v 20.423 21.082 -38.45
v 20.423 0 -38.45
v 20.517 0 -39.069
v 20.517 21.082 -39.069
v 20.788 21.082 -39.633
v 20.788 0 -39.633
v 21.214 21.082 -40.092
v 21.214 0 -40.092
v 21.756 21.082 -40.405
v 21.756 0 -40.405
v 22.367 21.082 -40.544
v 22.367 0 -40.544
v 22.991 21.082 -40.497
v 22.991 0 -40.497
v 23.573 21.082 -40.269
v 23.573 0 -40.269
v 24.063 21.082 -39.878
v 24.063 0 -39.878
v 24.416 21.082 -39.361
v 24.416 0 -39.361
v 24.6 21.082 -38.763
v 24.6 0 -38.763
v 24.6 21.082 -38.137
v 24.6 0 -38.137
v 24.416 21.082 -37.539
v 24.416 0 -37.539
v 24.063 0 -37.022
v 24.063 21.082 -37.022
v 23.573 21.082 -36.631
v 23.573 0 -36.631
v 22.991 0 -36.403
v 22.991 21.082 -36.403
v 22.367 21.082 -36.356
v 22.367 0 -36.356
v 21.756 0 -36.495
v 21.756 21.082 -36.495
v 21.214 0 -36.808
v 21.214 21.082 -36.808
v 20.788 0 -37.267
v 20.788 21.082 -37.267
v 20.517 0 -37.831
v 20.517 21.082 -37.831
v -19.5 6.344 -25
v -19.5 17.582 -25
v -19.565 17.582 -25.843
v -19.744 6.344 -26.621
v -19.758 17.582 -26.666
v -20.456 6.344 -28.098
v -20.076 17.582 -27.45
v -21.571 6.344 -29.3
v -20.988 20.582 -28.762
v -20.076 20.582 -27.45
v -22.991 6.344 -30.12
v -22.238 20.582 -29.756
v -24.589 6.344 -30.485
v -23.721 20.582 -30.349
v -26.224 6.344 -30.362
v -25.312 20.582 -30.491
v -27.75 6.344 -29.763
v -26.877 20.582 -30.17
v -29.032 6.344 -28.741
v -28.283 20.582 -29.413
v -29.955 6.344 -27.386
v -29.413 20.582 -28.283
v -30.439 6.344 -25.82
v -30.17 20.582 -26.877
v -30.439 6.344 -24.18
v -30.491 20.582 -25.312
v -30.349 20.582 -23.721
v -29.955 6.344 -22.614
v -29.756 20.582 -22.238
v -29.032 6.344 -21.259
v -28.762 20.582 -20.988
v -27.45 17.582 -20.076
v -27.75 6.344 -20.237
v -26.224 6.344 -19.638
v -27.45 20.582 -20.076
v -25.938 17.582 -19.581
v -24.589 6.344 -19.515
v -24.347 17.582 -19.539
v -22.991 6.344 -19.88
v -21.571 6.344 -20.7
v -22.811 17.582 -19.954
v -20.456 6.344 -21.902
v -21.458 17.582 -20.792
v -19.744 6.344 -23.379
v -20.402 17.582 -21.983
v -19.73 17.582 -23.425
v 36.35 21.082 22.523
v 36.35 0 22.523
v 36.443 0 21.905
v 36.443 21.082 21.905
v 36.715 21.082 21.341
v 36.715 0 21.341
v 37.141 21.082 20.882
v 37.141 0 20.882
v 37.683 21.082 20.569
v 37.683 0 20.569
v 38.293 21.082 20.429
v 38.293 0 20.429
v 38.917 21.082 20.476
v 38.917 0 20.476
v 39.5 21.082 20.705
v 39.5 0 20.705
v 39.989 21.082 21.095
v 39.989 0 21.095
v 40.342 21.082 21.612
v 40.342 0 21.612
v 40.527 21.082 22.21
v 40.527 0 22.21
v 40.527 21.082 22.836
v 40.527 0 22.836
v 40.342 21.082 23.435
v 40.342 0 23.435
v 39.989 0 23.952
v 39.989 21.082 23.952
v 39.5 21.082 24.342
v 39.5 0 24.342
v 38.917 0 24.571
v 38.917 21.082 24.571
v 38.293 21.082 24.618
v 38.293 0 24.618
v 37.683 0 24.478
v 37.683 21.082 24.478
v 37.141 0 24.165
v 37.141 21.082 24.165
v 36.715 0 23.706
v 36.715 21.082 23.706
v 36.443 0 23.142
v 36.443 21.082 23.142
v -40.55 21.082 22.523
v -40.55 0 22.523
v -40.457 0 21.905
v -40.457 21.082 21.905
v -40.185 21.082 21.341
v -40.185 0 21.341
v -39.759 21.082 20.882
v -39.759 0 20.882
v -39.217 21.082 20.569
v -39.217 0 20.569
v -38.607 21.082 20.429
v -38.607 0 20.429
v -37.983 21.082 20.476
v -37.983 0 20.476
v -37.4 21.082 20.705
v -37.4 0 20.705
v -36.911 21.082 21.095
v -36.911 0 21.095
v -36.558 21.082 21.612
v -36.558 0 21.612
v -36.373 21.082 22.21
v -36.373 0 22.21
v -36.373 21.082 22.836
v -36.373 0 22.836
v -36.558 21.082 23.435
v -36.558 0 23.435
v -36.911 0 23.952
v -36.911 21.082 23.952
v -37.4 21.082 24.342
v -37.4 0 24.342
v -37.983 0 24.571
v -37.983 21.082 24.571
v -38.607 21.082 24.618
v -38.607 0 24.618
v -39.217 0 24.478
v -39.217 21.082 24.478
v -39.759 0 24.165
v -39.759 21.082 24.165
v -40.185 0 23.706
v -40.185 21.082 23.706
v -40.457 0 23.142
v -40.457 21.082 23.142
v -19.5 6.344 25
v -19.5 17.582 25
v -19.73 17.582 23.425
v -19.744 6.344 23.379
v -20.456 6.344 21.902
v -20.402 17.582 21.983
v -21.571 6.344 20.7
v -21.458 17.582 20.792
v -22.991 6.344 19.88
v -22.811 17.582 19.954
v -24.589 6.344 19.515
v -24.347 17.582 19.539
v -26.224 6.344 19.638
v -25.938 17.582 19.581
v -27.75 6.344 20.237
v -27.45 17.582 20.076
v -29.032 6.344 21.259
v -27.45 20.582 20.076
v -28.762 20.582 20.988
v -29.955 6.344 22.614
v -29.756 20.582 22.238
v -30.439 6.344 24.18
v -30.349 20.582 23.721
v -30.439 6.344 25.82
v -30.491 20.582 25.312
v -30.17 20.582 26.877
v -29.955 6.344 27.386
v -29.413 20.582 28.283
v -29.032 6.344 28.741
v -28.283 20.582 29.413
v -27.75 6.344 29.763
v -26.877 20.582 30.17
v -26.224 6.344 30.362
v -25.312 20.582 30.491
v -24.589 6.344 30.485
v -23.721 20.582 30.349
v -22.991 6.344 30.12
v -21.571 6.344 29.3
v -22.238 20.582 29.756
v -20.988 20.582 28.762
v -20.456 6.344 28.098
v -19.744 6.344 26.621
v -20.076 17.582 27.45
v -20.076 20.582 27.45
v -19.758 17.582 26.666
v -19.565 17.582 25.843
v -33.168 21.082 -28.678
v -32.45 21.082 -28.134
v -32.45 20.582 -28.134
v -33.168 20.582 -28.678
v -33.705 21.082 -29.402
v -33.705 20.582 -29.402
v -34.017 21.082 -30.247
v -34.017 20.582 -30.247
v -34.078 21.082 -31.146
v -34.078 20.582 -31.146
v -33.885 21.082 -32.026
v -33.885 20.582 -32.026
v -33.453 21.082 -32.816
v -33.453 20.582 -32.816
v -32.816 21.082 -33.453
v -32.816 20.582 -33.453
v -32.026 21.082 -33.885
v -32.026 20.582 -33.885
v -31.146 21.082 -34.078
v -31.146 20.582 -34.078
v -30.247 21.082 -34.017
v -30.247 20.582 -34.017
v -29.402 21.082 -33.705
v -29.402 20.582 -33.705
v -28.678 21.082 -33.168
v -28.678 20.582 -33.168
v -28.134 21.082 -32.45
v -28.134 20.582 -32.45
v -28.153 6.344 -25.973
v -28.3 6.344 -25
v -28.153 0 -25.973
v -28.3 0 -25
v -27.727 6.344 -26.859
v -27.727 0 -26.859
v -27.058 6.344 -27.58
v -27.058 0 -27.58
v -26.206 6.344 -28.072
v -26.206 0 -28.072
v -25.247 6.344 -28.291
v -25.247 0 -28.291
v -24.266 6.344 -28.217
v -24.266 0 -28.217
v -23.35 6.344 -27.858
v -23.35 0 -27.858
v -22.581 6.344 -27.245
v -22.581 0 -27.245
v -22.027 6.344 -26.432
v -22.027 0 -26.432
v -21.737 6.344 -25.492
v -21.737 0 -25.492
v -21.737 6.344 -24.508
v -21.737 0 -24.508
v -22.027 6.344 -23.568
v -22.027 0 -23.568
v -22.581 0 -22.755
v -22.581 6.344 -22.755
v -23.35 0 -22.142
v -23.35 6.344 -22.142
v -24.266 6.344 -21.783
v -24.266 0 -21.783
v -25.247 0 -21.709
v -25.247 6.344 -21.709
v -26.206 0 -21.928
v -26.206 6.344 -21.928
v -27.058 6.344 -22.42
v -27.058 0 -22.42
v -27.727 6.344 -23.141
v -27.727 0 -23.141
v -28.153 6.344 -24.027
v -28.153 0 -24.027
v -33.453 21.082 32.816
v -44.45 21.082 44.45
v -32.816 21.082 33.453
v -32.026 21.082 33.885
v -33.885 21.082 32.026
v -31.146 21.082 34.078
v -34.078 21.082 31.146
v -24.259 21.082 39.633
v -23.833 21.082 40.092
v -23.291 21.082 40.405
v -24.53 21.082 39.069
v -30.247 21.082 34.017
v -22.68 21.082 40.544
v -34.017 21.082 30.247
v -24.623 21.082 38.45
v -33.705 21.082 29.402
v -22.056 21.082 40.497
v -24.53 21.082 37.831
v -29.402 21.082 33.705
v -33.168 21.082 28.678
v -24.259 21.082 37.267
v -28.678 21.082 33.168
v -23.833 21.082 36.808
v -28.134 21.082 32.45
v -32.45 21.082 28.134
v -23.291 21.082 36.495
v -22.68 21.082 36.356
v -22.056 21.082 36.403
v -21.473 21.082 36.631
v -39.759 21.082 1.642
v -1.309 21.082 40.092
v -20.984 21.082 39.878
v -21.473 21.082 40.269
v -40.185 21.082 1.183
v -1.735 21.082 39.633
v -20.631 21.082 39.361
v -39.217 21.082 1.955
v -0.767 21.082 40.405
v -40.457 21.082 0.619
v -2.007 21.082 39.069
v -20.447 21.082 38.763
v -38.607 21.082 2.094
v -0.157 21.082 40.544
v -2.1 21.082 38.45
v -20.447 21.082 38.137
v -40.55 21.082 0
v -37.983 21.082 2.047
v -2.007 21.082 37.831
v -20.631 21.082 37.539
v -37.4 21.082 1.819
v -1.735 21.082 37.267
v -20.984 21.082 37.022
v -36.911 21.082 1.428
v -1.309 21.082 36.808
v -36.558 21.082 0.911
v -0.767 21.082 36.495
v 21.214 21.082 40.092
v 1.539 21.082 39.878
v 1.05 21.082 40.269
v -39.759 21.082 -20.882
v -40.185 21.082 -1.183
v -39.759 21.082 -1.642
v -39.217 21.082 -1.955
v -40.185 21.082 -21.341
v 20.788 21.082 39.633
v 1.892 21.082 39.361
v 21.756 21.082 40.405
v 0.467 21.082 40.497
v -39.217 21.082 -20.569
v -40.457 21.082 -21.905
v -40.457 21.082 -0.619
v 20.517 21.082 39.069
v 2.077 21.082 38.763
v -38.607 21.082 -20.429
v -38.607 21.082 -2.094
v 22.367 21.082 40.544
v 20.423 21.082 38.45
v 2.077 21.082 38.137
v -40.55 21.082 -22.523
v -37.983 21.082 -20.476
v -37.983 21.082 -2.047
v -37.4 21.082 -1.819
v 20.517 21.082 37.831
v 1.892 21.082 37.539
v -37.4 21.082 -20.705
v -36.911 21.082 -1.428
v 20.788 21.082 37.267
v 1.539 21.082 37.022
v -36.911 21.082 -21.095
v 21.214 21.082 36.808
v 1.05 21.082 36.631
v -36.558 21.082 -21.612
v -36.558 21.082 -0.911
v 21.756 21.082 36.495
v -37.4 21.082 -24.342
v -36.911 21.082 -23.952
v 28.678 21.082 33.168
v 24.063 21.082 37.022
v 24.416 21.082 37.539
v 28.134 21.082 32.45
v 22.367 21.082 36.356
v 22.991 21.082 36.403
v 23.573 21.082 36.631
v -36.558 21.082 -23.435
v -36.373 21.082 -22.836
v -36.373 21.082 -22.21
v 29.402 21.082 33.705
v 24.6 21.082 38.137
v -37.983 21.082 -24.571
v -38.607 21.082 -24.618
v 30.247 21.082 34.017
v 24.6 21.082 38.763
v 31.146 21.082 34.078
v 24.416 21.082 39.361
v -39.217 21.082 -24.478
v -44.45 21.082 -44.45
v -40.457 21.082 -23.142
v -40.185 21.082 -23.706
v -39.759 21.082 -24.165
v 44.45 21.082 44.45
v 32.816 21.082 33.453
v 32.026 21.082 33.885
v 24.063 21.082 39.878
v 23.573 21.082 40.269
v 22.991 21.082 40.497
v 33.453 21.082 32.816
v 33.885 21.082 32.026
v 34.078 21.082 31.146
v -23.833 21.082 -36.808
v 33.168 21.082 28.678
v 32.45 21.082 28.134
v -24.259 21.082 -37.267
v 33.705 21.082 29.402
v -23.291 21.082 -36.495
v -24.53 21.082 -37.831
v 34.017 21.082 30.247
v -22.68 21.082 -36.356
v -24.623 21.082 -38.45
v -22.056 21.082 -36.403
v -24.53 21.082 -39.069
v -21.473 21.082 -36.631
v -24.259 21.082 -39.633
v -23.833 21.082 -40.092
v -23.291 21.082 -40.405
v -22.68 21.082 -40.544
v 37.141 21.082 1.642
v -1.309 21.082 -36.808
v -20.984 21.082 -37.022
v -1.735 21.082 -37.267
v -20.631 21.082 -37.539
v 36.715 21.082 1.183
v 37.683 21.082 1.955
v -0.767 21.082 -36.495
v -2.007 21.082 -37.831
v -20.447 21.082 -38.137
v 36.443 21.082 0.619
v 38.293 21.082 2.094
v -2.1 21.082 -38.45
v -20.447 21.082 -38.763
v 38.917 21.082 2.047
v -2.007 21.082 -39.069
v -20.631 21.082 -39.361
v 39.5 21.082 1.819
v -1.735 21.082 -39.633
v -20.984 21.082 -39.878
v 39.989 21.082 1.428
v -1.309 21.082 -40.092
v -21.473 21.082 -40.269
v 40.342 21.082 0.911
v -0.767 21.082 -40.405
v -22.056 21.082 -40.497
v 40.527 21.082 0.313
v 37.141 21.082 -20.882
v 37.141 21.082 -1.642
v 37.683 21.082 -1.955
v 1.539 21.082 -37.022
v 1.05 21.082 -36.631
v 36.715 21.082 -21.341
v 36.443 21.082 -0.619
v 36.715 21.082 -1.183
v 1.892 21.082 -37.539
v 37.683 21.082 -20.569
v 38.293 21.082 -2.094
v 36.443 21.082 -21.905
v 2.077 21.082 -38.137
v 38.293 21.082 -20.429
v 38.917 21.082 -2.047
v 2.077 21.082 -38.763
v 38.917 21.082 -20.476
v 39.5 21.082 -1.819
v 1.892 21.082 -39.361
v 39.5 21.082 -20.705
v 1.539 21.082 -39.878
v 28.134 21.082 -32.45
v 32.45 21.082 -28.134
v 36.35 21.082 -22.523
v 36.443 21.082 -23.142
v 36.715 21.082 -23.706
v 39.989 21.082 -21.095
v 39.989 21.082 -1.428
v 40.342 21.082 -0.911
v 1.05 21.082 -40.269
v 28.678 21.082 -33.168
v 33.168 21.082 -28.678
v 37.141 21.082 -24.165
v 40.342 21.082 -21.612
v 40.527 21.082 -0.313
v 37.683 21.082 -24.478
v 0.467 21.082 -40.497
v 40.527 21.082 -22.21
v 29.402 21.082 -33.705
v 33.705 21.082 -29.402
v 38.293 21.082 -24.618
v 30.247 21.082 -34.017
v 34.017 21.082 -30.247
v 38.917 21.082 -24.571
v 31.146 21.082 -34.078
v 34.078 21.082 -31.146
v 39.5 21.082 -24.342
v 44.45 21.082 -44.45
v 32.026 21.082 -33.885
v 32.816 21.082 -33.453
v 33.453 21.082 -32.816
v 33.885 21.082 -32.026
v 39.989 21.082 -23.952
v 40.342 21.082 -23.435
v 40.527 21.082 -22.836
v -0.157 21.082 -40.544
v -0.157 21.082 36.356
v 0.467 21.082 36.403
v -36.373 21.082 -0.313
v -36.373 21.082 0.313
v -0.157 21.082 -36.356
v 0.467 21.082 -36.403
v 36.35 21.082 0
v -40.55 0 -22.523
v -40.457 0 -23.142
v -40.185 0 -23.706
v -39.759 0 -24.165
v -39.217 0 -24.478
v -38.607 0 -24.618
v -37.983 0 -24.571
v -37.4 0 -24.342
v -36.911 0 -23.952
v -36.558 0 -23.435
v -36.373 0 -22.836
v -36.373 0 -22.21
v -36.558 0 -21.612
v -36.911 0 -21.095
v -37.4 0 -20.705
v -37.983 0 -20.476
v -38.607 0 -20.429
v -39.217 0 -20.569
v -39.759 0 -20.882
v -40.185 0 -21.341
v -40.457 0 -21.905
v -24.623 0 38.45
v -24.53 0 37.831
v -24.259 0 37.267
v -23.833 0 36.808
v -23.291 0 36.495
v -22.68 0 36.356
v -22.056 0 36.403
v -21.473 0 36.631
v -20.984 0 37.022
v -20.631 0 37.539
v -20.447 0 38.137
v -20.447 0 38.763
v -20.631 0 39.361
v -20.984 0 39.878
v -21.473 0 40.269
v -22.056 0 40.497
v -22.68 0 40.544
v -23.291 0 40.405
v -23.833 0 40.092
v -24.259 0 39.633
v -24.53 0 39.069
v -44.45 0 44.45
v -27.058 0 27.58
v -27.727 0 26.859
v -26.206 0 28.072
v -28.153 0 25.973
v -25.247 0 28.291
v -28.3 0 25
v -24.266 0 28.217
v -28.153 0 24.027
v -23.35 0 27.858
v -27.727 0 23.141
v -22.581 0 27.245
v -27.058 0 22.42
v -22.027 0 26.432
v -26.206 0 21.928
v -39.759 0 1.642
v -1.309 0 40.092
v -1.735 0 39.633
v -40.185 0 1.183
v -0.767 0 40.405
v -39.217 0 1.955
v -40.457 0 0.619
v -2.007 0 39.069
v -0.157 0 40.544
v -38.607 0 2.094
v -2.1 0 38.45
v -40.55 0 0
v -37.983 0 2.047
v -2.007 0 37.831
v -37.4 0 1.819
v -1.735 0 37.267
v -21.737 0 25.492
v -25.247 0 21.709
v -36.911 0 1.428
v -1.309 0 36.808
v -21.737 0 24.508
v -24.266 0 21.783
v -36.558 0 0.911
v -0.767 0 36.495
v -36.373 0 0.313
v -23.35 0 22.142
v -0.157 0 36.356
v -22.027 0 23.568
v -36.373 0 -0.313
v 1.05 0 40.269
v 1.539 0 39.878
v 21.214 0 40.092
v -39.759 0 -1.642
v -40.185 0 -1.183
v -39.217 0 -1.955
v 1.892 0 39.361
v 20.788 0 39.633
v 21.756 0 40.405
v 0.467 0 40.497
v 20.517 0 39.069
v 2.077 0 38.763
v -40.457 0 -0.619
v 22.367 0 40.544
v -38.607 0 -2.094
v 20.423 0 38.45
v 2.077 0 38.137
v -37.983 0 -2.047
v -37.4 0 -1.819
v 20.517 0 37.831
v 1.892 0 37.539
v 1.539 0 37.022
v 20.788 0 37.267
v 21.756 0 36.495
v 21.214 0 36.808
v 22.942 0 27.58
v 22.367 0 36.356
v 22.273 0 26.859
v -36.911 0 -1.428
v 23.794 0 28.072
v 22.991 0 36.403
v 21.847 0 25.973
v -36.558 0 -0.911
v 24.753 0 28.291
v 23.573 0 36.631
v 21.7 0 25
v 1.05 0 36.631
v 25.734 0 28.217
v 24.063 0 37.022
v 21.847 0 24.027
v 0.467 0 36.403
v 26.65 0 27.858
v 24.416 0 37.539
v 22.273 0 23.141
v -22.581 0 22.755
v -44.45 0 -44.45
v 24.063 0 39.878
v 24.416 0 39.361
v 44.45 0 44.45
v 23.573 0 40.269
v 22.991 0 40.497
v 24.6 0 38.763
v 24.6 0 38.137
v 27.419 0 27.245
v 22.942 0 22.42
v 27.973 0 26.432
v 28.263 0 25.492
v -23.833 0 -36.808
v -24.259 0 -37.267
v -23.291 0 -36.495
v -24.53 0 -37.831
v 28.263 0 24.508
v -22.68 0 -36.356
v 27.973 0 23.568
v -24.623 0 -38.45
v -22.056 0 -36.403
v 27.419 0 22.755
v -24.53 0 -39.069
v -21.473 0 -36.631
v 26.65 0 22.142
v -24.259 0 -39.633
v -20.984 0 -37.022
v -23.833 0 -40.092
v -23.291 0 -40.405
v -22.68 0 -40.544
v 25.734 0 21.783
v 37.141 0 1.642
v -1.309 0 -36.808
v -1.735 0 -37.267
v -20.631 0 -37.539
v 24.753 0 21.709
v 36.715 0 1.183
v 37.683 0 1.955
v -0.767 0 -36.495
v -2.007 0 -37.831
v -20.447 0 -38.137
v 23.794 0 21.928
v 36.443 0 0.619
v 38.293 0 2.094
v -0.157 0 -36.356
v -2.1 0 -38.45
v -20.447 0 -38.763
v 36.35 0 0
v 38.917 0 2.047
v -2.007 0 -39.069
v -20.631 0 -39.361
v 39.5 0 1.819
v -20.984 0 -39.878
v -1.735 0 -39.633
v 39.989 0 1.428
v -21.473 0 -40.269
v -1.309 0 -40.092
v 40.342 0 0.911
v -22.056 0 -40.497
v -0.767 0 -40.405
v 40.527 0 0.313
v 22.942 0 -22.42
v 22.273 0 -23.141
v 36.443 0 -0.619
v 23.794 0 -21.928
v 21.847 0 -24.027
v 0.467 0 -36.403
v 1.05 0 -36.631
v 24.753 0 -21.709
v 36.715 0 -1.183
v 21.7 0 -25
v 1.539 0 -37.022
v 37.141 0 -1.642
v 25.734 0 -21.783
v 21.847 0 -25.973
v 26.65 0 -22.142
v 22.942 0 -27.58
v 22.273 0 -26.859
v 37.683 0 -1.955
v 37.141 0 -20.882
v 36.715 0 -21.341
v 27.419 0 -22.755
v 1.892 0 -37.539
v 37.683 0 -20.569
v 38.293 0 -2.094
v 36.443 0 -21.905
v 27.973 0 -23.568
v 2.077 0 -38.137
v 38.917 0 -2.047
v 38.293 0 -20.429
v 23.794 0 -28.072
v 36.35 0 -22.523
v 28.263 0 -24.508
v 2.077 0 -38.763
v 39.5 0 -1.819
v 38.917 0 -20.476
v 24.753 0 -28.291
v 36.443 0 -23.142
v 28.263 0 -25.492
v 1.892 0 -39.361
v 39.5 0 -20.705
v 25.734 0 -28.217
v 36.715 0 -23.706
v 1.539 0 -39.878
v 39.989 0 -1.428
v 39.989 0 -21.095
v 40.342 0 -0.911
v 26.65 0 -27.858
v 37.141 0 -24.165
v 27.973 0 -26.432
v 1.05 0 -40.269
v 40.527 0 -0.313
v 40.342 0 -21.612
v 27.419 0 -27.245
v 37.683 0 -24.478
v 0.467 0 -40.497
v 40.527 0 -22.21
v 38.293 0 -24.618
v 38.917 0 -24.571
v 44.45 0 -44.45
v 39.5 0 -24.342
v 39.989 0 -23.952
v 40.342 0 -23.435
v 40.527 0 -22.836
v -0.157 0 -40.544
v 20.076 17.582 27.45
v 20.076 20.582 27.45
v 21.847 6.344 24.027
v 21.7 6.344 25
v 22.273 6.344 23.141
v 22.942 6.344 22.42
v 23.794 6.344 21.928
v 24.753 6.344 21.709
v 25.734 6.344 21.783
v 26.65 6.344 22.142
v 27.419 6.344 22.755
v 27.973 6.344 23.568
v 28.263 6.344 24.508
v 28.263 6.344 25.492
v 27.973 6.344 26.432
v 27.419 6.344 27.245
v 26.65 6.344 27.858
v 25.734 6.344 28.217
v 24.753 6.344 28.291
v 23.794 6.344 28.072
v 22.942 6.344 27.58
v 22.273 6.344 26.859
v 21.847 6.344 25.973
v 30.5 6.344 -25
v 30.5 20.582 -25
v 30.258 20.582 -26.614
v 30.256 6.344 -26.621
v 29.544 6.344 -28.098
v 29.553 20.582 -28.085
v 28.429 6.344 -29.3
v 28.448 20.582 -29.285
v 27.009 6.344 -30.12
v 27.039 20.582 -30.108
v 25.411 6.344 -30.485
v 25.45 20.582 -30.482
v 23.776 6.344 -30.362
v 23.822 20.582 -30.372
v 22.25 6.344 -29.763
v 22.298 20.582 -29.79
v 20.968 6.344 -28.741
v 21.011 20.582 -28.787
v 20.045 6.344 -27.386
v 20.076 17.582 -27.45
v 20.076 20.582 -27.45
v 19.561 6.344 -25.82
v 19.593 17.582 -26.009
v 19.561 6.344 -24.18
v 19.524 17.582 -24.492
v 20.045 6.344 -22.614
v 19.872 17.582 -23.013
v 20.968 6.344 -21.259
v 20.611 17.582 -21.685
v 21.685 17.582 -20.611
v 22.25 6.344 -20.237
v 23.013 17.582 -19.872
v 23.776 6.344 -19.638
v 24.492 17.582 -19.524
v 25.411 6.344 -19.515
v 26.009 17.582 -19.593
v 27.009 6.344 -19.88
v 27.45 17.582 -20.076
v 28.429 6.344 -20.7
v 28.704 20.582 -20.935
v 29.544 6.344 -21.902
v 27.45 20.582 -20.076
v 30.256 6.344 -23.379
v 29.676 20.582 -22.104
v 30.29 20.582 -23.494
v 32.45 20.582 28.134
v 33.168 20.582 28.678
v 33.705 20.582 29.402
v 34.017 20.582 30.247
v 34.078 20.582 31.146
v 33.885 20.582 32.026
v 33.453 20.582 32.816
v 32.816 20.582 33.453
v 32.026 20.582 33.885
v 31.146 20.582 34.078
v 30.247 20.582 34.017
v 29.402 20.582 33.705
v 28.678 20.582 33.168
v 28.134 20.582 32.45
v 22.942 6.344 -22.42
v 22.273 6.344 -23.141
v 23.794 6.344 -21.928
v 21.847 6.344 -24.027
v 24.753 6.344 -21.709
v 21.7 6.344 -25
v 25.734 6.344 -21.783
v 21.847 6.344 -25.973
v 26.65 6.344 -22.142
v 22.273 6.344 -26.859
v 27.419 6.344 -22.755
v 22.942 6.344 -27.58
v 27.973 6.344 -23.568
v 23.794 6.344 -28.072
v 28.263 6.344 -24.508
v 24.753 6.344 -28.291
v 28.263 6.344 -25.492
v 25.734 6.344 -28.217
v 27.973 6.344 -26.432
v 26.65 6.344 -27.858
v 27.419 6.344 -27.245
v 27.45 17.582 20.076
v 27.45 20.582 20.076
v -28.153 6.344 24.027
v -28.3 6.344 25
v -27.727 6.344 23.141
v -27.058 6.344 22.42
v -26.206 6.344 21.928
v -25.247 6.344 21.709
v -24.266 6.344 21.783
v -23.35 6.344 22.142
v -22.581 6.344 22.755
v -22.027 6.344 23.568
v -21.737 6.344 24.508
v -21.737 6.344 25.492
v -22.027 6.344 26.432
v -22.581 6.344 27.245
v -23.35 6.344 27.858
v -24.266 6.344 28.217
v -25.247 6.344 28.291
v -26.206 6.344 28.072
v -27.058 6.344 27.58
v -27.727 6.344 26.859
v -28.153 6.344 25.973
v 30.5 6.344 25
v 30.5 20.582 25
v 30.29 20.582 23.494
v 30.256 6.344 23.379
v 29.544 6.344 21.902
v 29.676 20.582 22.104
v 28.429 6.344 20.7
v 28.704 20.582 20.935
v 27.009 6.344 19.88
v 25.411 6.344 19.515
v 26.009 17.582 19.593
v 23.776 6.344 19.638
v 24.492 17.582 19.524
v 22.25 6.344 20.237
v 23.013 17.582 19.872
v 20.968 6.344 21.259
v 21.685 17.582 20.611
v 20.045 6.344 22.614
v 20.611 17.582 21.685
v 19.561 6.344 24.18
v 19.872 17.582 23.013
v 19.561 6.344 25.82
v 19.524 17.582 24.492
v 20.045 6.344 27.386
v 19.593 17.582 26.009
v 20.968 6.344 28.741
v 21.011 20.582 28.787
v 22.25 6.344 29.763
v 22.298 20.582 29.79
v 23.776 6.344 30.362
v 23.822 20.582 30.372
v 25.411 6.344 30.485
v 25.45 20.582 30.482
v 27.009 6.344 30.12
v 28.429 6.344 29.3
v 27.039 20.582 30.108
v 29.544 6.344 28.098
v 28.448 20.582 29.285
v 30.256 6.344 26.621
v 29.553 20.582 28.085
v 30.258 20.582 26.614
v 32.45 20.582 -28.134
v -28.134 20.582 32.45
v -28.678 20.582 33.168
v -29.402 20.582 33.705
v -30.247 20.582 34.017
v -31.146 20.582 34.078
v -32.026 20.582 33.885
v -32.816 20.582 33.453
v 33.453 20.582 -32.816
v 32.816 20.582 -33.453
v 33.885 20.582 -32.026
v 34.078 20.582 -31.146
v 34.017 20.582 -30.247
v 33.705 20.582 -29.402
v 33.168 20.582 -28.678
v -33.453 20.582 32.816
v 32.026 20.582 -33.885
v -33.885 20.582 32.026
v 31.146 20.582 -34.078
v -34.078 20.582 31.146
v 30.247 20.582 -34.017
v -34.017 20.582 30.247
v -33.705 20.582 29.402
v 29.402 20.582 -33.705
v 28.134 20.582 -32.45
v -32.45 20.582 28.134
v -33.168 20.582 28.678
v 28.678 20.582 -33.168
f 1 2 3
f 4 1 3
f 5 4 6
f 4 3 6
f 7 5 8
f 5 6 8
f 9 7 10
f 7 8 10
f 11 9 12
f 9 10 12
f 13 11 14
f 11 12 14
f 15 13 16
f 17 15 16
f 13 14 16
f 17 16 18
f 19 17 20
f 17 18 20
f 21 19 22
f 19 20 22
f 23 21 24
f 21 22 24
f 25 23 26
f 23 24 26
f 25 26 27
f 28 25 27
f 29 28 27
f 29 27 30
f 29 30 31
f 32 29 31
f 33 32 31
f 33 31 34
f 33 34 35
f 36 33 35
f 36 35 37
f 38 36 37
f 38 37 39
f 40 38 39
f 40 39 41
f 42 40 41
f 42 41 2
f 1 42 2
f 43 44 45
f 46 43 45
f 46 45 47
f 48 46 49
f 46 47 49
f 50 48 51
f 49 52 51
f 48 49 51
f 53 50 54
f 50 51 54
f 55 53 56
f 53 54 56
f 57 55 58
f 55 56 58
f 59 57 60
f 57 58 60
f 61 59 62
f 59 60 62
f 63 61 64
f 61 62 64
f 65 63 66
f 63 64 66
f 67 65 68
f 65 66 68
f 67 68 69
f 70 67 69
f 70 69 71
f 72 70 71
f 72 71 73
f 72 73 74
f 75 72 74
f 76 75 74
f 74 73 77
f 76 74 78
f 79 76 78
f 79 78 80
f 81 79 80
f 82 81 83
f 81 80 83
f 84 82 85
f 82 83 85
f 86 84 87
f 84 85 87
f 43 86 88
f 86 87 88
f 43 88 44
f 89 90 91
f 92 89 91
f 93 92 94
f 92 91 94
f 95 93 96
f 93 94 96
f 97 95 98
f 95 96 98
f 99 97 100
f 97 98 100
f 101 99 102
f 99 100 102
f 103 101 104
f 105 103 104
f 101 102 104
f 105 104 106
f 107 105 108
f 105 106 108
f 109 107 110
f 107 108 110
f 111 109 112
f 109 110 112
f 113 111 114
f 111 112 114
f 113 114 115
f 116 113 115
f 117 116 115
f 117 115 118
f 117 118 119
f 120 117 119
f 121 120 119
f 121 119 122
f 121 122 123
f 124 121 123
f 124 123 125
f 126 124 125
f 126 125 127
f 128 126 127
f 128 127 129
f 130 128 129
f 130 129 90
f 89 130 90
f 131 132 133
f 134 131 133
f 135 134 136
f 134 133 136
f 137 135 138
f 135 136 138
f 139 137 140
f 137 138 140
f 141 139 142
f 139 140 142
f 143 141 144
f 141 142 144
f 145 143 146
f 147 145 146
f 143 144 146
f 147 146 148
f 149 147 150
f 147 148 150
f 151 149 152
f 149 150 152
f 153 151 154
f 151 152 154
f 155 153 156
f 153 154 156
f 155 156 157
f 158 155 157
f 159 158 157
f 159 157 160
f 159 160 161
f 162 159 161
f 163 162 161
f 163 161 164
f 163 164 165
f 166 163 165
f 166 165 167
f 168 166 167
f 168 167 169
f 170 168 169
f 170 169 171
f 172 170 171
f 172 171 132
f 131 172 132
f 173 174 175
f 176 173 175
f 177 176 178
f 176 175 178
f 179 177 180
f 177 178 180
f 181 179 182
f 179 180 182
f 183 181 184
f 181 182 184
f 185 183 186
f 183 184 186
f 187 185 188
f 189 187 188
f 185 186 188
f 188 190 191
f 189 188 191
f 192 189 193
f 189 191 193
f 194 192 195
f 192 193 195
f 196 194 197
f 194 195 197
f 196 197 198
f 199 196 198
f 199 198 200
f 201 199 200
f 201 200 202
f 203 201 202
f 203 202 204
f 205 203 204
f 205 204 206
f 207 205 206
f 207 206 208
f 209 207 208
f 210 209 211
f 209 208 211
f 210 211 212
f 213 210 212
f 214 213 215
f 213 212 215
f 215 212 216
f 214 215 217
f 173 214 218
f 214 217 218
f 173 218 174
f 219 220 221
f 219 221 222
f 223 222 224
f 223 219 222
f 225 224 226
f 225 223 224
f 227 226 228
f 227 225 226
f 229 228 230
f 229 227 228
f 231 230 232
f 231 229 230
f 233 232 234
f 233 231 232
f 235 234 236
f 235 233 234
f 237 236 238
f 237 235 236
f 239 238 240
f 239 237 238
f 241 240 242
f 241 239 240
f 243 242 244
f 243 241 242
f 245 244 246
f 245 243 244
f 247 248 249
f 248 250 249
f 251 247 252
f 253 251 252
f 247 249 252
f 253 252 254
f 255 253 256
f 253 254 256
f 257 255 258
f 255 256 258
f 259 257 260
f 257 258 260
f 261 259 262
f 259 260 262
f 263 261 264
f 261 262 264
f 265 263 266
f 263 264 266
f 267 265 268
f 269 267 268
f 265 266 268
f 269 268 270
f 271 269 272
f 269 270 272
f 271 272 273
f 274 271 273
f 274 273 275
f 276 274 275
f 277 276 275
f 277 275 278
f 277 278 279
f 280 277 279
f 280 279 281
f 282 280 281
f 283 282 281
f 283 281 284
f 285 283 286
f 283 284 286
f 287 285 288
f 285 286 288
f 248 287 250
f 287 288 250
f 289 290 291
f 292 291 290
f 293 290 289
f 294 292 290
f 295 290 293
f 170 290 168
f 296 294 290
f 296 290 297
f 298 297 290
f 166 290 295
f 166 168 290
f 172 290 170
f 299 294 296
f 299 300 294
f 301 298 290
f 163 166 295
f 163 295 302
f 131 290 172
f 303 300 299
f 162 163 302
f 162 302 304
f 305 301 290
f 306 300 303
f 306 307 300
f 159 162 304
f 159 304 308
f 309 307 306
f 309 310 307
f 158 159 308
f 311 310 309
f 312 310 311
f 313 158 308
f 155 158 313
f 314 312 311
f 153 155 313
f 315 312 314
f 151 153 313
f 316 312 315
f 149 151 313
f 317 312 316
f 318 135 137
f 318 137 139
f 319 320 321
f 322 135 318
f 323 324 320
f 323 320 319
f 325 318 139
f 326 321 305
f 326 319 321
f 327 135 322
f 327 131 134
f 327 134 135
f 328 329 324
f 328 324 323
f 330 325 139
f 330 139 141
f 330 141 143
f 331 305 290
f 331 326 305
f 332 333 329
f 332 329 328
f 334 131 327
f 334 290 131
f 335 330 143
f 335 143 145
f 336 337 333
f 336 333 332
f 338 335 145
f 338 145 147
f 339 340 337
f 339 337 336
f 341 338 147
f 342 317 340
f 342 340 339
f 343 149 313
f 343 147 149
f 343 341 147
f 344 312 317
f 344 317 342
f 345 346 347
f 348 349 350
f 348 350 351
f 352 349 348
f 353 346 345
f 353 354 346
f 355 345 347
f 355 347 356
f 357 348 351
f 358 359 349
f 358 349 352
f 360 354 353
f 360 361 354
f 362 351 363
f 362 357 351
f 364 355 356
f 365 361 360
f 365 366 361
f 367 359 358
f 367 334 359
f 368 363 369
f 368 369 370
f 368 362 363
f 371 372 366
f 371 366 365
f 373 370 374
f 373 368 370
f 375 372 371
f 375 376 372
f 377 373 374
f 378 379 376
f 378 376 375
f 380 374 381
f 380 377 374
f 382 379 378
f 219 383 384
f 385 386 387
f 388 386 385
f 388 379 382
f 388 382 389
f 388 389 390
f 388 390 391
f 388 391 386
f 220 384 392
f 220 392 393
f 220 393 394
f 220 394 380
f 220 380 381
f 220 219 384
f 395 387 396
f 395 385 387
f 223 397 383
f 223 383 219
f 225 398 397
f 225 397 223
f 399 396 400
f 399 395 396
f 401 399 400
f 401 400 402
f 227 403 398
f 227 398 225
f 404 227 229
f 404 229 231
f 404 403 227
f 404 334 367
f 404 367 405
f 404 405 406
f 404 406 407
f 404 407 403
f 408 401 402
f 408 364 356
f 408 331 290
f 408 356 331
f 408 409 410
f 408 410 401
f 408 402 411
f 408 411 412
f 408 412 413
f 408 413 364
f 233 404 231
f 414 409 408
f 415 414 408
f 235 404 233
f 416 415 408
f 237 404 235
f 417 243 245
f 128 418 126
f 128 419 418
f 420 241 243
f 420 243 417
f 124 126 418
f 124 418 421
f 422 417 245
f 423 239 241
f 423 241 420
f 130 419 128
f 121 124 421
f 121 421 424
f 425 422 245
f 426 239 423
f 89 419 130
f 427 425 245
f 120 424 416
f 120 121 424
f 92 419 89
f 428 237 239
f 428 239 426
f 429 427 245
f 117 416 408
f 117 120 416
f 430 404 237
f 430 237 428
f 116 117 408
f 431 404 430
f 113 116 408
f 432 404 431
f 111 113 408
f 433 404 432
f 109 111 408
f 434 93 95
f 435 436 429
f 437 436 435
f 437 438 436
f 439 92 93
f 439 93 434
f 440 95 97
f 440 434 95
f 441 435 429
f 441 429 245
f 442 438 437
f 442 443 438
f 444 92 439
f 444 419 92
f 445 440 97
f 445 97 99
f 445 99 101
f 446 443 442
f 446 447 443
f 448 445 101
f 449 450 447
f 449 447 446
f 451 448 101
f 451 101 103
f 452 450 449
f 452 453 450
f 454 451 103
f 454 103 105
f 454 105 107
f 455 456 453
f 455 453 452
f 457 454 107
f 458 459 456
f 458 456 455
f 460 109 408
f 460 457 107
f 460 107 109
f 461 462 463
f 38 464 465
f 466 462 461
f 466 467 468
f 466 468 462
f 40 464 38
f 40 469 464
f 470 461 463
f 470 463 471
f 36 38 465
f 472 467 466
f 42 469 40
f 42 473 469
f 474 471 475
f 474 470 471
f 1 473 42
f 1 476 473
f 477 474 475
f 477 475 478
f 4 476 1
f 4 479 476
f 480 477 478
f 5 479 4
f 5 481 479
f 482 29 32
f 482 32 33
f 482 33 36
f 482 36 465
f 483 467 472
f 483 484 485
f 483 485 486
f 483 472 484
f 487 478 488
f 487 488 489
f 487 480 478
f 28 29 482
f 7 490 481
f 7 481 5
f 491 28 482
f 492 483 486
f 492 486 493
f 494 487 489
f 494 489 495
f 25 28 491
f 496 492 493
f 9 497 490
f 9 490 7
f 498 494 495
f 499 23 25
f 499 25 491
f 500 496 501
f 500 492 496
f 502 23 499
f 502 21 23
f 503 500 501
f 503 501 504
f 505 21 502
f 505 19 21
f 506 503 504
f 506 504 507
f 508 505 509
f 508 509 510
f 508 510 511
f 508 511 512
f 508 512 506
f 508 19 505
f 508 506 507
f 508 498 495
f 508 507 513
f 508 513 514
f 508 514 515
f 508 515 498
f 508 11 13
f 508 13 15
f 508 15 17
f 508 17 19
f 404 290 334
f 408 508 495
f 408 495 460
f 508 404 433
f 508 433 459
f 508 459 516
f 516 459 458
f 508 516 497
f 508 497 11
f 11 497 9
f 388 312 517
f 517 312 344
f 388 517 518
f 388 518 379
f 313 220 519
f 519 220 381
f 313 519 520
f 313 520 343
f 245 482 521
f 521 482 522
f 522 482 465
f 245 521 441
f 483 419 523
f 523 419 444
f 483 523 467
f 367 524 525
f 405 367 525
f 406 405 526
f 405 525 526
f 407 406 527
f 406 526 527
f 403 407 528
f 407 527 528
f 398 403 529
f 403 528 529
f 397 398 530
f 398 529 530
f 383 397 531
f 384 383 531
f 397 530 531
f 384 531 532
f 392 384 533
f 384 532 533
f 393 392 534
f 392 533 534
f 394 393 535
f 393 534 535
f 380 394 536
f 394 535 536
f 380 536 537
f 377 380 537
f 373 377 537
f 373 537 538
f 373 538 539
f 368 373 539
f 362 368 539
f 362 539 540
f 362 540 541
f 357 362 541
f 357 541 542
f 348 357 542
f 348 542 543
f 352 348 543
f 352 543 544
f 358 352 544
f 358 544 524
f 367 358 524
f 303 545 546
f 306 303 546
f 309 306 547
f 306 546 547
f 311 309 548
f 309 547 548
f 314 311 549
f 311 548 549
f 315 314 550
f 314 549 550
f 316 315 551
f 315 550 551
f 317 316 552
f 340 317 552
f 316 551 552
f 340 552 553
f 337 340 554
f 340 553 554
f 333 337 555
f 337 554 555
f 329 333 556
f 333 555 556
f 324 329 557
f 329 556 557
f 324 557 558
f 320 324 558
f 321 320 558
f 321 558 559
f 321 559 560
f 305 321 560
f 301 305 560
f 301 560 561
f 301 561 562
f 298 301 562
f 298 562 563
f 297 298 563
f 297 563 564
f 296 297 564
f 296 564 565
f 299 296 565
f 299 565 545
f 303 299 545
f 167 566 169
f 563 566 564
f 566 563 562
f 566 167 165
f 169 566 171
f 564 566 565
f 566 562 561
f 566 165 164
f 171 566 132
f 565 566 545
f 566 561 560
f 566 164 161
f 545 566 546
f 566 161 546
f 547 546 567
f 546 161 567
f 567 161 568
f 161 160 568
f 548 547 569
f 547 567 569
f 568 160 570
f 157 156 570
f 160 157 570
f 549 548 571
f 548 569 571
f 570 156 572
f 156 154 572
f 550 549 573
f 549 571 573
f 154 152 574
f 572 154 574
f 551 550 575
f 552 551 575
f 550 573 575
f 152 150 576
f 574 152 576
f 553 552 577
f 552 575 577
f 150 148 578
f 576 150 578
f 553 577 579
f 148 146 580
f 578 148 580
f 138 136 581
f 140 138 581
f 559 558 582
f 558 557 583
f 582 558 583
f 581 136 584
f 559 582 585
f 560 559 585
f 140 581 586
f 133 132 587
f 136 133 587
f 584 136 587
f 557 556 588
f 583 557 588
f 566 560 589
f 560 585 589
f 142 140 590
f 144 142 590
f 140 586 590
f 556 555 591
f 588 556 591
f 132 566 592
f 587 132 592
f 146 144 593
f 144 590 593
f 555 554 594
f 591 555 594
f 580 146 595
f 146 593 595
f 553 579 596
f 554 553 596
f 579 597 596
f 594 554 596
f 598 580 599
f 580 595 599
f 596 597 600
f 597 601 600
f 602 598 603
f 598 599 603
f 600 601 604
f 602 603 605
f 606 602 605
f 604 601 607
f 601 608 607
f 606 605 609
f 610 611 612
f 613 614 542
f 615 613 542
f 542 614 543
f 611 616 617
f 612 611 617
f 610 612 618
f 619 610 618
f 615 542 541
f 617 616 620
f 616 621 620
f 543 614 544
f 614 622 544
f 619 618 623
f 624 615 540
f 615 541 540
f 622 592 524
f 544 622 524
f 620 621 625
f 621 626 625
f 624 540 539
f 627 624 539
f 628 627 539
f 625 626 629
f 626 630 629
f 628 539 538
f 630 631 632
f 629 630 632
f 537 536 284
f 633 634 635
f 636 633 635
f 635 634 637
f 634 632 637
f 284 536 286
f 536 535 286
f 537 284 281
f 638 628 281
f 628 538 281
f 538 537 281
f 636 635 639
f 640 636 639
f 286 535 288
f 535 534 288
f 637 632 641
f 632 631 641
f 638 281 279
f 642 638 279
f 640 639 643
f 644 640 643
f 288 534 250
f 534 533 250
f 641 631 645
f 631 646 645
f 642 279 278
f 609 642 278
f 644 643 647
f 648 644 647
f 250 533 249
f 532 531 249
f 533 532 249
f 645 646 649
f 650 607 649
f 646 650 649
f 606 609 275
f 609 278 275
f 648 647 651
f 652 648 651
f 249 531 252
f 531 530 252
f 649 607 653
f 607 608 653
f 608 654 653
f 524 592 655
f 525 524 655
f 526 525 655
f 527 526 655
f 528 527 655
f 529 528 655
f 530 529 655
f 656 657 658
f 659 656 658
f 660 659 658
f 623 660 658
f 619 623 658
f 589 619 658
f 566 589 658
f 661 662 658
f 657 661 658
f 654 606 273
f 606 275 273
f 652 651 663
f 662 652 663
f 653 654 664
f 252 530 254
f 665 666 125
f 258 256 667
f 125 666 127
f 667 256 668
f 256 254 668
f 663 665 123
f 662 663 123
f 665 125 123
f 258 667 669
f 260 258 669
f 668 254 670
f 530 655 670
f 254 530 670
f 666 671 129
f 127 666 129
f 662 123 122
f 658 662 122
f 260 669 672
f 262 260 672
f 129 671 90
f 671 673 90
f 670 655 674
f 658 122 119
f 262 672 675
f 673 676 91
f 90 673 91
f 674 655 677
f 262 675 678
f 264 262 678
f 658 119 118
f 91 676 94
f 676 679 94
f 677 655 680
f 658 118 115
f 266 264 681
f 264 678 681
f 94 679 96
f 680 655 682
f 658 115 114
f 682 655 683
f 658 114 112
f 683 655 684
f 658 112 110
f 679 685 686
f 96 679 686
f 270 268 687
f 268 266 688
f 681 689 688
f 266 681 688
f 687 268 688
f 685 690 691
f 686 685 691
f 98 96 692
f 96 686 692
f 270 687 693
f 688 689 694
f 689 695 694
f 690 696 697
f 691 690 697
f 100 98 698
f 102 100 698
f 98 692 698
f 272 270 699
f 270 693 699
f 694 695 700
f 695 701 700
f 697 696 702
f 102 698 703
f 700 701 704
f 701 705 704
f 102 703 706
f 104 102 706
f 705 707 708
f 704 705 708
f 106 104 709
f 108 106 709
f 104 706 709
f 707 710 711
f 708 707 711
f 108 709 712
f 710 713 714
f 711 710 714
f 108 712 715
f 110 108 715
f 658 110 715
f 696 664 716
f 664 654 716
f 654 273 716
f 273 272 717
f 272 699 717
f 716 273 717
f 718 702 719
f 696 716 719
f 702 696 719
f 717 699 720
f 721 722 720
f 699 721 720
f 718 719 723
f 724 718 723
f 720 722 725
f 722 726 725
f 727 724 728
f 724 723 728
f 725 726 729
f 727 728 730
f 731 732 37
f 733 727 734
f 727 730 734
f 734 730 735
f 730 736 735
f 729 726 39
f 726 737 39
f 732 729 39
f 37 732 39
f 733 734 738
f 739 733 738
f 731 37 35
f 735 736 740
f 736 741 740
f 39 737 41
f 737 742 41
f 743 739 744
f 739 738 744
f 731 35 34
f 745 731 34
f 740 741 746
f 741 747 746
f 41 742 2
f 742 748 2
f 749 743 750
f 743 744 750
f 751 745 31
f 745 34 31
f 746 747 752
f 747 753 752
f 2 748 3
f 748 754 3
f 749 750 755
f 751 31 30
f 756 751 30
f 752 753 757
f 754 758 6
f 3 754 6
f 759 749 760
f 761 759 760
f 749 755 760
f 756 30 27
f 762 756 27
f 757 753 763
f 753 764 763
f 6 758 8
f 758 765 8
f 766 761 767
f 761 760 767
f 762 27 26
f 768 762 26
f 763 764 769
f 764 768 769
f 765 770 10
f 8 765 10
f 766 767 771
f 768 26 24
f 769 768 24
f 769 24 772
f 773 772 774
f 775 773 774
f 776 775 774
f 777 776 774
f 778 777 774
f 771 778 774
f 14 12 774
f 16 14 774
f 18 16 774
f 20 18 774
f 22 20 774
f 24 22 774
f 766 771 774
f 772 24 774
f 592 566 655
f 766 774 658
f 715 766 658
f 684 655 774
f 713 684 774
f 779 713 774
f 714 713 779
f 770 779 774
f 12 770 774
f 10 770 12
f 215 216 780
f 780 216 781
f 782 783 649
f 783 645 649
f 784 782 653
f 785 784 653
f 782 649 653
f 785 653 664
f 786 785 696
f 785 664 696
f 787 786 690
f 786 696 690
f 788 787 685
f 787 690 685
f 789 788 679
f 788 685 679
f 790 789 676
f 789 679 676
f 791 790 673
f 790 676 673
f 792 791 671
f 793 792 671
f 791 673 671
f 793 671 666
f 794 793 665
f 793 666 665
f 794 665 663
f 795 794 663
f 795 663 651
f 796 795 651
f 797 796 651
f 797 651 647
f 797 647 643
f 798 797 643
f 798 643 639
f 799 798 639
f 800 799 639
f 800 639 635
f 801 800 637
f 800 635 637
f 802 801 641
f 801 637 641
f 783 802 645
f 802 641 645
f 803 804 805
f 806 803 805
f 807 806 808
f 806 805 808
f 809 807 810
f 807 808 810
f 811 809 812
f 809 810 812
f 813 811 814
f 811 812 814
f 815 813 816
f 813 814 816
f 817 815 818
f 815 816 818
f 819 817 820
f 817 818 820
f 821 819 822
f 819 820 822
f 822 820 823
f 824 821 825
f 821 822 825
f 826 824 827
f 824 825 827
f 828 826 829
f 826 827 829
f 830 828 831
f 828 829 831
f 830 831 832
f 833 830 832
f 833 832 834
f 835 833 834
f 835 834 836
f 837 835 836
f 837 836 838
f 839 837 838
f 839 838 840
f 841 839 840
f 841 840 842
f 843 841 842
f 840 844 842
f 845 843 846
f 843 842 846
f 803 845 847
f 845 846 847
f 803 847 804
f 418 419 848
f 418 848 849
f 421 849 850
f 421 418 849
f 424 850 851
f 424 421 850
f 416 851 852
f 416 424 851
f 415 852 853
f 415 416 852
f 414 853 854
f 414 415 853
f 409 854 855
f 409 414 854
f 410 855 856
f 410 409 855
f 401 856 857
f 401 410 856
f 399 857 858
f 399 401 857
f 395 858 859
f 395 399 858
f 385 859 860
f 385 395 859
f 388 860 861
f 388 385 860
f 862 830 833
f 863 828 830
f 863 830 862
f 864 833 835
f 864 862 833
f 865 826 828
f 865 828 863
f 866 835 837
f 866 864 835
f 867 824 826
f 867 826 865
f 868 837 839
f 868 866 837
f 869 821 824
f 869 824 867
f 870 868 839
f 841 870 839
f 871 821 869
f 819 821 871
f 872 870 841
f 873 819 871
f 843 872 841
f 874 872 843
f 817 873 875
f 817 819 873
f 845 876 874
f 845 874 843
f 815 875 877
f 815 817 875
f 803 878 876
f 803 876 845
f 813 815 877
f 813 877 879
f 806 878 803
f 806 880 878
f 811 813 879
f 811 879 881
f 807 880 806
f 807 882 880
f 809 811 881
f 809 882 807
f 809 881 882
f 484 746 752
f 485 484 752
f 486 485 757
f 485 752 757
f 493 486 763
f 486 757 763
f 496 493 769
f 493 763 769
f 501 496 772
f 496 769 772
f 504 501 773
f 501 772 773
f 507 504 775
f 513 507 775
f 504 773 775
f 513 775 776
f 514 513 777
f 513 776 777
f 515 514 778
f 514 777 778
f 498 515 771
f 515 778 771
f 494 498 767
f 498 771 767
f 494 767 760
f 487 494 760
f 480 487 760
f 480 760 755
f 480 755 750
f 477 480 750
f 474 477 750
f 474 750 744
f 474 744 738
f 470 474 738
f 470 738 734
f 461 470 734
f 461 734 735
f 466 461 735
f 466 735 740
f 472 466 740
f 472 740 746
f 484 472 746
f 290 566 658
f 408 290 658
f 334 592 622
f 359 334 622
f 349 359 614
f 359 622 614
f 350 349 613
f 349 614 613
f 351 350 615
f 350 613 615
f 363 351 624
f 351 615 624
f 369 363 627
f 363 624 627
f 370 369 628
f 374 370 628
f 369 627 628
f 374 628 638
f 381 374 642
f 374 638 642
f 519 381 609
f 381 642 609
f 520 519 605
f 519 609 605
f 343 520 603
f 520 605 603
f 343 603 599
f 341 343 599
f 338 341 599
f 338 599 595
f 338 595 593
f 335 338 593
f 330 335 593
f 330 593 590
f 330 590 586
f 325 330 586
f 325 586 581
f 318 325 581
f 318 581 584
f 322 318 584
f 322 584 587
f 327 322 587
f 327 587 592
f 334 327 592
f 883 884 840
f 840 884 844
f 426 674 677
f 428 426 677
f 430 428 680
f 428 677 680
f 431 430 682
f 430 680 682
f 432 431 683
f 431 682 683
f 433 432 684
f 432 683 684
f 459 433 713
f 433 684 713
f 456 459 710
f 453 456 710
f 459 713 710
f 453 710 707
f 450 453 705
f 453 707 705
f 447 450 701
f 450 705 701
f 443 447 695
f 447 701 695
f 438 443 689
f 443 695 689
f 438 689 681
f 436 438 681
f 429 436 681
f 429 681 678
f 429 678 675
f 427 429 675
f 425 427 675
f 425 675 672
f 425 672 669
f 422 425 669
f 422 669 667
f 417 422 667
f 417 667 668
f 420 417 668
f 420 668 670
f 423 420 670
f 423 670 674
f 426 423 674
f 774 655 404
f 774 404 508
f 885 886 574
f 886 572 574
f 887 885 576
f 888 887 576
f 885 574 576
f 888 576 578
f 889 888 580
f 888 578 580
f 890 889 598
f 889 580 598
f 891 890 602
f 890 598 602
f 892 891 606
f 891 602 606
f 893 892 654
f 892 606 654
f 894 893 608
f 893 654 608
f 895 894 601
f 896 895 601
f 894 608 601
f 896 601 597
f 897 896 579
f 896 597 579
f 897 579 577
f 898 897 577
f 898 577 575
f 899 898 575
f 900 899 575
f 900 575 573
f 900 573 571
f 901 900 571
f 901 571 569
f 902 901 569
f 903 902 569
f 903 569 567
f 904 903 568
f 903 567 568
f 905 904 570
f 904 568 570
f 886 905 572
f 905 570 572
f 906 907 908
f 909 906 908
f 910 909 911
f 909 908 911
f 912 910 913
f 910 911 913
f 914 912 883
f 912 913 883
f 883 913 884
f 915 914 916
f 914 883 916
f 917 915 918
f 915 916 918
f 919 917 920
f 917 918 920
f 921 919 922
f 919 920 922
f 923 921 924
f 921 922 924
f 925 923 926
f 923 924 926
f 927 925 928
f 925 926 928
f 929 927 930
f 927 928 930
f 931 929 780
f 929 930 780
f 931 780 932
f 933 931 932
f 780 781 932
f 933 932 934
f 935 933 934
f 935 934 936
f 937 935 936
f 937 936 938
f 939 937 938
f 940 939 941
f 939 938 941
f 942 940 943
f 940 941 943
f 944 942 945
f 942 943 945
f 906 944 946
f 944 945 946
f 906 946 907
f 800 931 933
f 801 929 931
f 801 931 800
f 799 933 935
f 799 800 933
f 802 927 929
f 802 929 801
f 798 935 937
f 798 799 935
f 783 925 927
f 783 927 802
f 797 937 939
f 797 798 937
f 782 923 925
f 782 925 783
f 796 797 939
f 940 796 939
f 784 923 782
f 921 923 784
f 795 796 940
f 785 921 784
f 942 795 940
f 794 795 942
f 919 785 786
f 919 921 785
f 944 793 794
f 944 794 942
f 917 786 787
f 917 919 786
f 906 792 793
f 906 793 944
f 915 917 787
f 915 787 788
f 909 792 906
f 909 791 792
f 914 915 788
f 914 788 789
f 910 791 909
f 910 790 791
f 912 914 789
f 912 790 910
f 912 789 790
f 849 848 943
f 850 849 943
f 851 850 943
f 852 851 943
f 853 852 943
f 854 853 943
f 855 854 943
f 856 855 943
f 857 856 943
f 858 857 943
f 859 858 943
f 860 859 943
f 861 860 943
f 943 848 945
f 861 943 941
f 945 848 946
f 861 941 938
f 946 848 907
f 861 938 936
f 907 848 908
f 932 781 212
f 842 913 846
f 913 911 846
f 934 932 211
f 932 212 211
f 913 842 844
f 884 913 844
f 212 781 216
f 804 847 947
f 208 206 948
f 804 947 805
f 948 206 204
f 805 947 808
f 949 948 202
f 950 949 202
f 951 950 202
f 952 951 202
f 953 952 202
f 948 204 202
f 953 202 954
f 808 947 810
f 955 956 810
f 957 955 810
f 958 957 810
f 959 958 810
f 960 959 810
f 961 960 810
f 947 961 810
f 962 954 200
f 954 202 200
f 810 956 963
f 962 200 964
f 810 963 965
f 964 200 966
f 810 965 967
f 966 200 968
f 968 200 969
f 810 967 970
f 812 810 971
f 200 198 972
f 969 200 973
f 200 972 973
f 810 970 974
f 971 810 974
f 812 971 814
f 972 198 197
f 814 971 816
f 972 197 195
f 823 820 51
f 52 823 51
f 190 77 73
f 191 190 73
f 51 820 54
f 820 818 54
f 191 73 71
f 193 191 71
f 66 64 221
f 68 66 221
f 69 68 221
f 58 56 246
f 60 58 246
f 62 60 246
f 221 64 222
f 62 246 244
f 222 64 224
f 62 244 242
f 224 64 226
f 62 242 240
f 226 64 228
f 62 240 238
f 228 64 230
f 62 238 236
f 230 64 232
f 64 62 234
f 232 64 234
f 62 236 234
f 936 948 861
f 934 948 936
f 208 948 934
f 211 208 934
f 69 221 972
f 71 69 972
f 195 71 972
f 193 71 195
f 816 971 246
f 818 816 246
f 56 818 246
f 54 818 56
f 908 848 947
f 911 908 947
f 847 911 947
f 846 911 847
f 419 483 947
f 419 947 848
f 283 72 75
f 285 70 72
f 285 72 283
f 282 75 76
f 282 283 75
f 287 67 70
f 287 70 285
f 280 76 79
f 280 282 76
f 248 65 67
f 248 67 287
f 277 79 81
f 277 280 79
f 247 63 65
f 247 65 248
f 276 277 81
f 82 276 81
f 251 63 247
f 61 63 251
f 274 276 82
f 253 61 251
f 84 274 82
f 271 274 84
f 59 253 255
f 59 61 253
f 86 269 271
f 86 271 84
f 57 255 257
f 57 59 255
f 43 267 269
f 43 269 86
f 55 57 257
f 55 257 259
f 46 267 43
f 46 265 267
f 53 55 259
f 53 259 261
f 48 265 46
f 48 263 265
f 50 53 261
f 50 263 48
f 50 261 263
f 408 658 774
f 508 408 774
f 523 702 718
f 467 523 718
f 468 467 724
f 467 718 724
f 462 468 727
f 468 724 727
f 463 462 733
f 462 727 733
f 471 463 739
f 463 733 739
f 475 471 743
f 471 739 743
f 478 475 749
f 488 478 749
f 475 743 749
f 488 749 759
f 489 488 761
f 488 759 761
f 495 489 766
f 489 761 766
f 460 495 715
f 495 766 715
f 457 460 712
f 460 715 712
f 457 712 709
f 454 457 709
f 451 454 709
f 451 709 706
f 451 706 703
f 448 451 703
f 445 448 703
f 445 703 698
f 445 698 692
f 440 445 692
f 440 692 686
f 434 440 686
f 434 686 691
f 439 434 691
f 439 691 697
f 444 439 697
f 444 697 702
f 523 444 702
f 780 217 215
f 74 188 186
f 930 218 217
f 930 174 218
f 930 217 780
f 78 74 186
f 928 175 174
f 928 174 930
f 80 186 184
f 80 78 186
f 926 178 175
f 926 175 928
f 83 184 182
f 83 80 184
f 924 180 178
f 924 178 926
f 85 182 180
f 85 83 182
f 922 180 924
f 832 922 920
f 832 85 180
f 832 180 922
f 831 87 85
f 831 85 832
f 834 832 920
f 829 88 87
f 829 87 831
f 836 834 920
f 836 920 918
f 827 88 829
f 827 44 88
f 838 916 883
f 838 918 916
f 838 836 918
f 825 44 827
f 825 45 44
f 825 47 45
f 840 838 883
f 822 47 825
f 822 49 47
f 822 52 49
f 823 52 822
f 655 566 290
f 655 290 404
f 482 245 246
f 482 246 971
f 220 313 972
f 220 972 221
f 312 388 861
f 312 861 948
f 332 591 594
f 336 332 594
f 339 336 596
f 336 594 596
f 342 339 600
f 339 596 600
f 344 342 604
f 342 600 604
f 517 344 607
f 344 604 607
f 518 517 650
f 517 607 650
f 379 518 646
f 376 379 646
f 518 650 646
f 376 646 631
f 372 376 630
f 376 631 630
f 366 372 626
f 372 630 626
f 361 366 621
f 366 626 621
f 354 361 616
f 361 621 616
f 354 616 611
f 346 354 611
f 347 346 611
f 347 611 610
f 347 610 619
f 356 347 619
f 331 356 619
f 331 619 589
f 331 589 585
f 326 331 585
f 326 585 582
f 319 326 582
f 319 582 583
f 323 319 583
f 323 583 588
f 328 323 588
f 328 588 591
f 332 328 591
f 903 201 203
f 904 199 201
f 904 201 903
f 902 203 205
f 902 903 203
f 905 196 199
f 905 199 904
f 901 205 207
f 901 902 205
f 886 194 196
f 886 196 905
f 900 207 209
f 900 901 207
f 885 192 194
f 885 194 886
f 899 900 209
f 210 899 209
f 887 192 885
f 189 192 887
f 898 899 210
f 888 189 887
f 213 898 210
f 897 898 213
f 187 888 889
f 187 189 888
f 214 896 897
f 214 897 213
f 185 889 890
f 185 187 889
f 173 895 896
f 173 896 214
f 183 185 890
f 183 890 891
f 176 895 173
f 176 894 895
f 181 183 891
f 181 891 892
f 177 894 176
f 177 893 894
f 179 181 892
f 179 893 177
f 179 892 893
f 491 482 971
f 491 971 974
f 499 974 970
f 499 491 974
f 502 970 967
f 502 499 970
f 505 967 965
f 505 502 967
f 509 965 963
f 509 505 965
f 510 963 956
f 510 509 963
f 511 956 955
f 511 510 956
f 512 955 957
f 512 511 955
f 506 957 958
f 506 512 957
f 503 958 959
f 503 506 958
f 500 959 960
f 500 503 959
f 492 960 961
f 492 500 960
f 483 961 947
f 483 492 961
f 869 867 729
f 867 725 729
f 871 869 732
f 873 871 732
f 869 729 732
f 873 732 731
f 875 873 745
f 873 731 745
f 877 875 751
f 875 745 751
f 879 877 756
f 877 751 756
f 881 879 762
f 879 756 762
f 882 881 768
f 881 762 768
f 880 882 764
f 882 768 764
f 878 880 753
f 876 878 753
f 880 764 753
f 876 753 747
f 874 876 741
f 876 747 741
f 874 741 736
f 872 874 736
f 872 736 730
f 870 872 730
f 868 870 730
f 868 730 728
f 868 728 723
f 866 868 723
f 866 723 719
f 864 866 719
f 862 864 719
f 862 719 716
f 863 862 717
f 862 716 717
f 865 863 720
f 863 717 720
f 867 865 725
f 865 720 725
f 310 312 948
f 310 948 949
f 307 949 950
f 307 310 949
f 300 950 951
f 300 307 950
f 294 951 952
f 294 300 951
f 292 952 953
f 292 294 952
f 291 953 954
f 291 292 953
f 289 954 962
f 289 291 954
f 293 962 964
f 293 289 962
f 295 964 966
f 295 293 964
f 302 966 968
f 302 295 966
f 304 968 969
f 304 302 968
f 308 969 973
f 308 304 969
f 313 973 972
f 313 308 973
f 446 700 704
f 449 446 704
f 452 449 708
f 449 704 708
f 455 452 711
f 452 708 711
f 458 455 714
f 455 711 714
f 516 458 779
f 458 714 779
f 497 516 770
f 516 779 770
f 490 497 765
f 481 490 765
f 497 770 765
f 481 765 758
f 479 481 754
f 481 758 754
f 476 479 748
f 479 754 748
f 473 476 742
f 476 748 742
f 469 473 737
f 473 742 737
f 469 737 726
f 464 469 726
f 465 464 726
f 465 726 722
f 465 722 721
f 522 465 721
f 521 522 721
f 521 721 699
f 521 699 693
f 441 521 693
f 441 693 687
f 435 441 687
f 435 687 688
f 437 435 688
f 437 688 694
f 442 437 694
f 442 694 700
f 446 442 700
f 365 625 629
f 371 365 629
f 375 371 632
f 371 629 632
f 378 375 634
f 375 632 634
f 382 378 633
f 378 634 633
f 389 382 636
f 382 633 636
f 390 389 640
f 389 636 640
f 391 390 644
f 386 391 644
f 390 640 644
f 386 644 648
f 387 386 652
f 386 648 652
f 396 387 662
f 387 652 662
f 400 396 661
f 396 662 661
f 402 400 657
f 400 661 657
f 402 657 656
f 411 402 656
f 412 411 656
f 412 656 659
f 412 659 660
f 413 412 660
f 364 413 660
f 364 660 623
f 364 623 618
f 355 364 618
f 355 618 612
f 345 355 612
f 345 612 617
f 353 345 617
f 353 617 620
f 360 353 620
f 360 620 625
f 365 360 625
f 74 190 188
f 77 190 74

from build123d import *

# Parameters (mm, degrees)
SKETCH1_W                      = 88.9
SKETCH1_H                      = 88.9
BOSS_EXTRUDE1_DEPTH            = 21.082
CUT_EXTRUDE1_DEPTH             = 0.5
SKETCH3_W                      = 54.9
SKETCH3_H                      = 54.9
CUT_EXTRUDE2_DEPTH             = 3
FILLET1_R                      = 6.35
CBORE_FOR_M6_SHCS1_D           = 6.6
CBORE_FOR_M6_SHCS1_CBORE_D     = 11
CBORE_FOR_M6_SHCS1_CBORE_DEPTH = 14.7376
M5X0_8_TAPPED_HOLE1_D          = 4.2


with BuildPart() as part:
    # Sketch1 → Boss-Extrude1 (new body)
    with BuildSketch(Plane(origin=(0, 0, 0), x_dir=(1, 0, 0), z_dir=(0, 1, 0))):
        Rectangle(SKETCH1_W, SKETCH1_H)
    extrude(amount=BOSS_EXTRUDE1_DEPTH)

    # Sketch2 → Cut-Extrude1 (cut)
    with BuildSketch(Plane(origin=(0, 21.082, 0), x_dir=(1, 0, 0), z_dir=(0, 1, 0))):
        with BuildLine():
            Line((28.134397615, -32.45), (-28.134397615, -32.45))
            ThreePointArc((-28.134397615, -32.45), (-33.157106781, -33.157106781), (-32.45, -28.134397615))
            Line((-32.45, -28.134397615), (-32.45, 28.134397615))
            ThreePointArc((-32.45, 28.134397615), (-33.157106781, 33.157106781), (-28.134397615, 32.45))
            Line((-28.134397615, 32.45), (28.134397615, 32.45))
            ThreePointArc((28.134397615, 32.45), (33.157106781, 33.157106781), (32.45, 28.134397615))
            Line((32.45, 28.134397615), (32.45, -28.134397615))
            ThreePointArc((32.45, -28.134397615), (33.157106781, -33.157106781), (28.134397615, -32.45))
        make_face()
    extrude(amount=-CUT_EXTRUDE1_DEPTH, mode=Mode.SUBTRACT)

    # Sketch3 → Cut-Extrude2 (cut)
    with BuildSketch(Plane(origin=(0, 20.582, 0), x_dir=(1, 0, 0), z_dir=(0, 1, 0))):
        Rectangle(SKETCH3_W, SKETCH3_H)
    extrude(amount=-CUT_EXTRUDE2_DEPTH, mode=Mode.SUBTRACT)

    # Fillet1
    fillet1_edges = [part.edges().sort_by_distance(p)[0] for p in [
        (27.45, 19.082, 27.45),
        (-27.45, 19.082, 27.45),
        (-27.45, 19.082, -27.45),
        (27.45, 19.082, -27.45),
    ]]
    fillet(fillet1_edges, radius=FILLET1_R)

    # CBORE for M6 SHCS1 (through all)
    with Locations(Plane(origin=(0, 21.082, 0), x_dir=(1, 0, 0), z_dir=(0, 1, 0))):
        with Locations((-25, 25), (25, 25), (25, -25), (-25, -25)):
            CounterBoreHole(CBORE_FOR_M6_SHCS1_D / 2, CBORE_FOR_M6_SHCS1_CBORE_D / 2, CBORE_FOR_M6_SHCS1_CBORE_DEPTH)

    # M5x0.8 Tapped Hole1 (through all)
    with Locations(Plane(origin=(0, 21.082, 0), x_dir=(1, 0, 0), z_dir=(0, 1, 0))):
        with Locations((-38.45, 22.523488527), (-38.45, 0), (-38.45, -22.523488527), (-22.523488527, -38.45), (0, -38.45), (22.523488527, -38.45), (38.45, -22.523488527), (38.45, 0), (38.45, 22.523488527), (22.523488527, 38.45), (0, 38.45), (-22.523488527, 38.45)):
            Hole(M5X0_8_TAPPED_HOLE1_D / 2)


solid = part.part
